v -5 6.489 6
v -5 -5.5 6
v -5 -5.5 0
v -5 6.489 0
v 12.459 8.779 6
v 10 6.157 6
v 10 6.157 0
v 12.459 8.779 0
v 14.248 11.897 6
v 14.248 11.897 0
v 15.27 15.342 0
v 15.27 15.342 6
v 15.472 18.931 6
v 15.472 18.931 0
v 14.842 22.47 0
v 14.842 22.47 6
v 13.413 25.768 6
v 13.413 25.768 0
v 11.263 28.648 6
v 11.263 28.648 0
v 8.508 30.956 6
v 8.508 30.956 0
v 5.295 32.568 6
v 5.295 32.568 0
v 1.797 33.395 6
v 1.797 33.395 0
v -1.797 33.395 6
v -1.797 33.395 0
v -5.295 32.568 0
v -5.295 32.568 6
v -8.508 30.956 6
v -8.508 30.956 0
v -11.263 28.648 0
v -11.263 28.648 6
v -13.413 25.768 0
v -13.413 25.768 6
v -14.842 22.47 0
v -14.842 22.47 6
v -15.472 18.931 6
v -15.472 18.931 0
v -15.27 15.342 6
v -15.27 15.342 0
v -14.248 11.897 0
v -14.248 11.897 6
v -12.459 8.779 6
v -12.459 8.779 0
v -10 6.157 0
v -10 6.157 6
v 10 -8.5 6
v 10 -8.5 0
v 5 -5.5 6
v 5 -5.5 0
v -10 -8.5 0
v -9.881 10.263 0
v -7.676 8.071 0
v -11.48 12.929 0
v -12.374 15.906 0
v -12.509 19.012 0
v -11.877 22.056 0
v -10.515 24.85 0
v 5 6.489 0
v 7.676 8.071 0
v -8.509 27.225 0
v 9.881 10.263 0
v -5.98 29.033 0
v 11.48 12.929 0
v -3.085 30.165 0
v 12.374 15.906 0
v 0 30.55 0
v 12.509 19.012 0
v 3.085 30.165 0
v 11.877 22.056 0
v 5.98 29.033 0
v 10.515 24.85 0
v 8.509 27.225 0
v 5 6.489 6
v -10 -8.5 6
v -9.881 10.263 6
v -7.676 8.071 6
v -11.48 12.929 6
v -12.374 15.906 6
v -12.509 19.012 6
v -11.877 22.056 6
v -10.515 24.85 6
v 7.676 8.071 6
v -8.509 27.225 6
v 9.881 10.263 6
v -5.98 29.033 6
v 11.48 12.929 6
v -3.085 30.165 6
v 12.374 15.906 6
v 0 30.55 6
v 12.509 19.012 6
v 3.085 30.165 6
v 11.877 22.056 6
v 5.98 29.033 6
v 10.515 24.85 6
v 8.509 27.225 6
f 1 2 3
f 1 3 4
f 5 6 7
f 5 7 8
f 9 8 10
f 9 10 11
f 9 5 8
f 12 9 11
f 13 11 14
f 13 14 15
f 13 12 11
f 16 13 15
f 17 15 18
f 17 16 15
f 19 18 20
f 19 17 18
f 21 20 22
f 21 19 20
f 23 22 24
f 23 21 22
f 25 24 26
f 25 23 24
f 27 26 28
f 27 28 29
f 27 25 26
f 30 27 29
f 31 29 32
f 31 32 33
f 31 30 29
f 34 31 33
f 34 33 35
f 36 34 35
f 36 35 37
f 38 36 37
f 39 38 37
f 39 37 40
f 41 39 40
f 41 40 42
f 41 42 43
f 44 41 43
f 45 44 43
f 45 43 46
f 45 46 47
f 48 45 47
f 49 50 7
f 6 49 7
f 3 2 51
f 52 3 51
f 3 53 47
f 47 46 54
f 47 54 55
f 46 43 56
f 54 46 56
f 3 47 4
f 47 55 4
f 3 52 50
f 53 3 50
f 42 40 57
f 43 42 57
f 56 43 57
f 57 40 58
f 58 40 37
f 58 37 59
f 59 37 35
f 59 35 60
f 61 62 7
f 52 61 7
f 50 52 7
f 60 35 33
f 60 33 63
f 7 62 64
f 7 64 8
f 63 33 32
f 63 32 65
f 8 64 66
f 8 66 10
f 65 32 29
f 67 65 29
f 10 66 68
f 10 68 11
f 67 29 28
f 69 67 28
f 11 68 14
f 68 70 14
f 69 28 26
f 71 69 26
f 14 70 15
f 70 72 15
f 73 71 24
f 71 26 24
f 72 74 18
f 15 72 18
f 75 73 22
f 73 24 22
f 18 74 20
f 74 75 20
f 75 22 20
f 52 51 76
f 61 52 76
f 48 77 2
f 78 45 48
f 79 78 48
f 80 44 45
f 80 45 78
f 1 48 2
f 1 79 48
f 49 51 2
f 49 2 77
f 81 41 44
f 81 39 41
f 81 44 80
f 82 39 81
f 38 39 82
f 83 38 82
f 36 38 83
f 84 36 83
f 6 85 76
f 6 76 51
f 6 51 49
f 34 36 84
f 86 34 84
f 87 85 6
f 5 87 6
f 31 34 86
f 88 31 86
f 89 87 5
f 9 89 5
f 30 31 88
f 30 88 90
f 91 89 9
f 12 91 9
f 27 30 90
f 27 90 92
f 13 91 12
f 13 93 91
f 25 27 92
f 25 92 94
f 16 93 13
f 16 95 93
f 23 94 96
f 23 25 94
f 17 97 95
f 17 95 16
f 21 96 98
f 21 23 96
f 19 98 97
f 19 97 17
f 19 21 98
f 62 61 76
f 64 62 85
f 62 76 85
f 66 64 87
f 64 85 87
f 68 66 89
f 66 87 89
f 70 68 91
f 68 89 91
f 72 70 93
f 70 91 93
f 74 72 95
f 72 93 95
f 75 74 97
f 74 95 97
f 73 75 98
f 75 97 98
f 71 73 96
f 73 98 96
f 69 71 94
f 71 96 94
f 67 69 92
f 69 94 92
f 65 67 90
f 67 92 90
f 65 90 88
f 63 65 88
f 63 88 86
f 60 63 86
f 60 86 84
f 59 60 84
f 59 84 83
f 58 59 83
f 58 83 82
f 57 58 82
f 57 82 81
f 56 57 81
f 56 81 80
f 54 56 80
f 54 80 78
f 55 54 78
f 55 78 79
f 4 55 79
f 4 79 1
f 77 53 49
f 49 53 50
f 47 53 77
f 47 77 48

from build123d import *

# Parameters (mm, degrees)
ESQUISSE1_W             = 20
ESQUISSE1_H             = 17
BOSS_EXTRU_1_DEPTH      = 6
ESQUISSE2_R             = 15.5
BOSS_EXTRU_2_DEPTH      = 6
ESQUISSE3_R             = 12.55
ENL_V_MAT_EXTRU_1_DEPTH = 6
ESQUISSE4_W             = 10
ESQUISSE4_H             = 11.989026974
ENL_V_MAT_EXTRU_2_DEPTH = 10


with BuildPart() as part:
    # Esquisse1 → Boss.-Extru.1 (new body)
    with BuildSketch(Plane.XY):
        Rectangle(ESQUISSE1_W, ESQUISSE1_H)
    extrude(amount=BOSS_EXTRU_1_DEPTH)

    # Esquisse2 → Boss.-Extru.2 (add)
    with BuildSketch(Plane.XY.offset(6)):
        with Locations((0, 18)):
            Circle(ESQUISSE2_R)
    extrude(amount=-BOSS_EXTRU_2_DEPTH)

    # Esquisse3 → Enlèv. mat.-Extru.1 (cut)
    with BuildSketch(Plane.XY.offset(6)):
        with Locations((0, 18)):
            Circle(ESQUISSE3_R)
    extrude(amount=-ENL_V_MAT_EXTRU_1_DEPTH, mode=Mode.SUBTRACT)

    # Esquisse4 → Enlèv. mat.-Extru.2 (cut)
    with BuildSketch(Plane.XY.offset(6)):
        with Locations((0, 0.494513487)):
            Rectangle(ESQUISSE4_W, ESQUISSE4_H)
    extrude(amount=-ENL_V_MAT_EXTRU_2_DEPTH, mode=Mode.SUBTRACT)


solid = part.part
